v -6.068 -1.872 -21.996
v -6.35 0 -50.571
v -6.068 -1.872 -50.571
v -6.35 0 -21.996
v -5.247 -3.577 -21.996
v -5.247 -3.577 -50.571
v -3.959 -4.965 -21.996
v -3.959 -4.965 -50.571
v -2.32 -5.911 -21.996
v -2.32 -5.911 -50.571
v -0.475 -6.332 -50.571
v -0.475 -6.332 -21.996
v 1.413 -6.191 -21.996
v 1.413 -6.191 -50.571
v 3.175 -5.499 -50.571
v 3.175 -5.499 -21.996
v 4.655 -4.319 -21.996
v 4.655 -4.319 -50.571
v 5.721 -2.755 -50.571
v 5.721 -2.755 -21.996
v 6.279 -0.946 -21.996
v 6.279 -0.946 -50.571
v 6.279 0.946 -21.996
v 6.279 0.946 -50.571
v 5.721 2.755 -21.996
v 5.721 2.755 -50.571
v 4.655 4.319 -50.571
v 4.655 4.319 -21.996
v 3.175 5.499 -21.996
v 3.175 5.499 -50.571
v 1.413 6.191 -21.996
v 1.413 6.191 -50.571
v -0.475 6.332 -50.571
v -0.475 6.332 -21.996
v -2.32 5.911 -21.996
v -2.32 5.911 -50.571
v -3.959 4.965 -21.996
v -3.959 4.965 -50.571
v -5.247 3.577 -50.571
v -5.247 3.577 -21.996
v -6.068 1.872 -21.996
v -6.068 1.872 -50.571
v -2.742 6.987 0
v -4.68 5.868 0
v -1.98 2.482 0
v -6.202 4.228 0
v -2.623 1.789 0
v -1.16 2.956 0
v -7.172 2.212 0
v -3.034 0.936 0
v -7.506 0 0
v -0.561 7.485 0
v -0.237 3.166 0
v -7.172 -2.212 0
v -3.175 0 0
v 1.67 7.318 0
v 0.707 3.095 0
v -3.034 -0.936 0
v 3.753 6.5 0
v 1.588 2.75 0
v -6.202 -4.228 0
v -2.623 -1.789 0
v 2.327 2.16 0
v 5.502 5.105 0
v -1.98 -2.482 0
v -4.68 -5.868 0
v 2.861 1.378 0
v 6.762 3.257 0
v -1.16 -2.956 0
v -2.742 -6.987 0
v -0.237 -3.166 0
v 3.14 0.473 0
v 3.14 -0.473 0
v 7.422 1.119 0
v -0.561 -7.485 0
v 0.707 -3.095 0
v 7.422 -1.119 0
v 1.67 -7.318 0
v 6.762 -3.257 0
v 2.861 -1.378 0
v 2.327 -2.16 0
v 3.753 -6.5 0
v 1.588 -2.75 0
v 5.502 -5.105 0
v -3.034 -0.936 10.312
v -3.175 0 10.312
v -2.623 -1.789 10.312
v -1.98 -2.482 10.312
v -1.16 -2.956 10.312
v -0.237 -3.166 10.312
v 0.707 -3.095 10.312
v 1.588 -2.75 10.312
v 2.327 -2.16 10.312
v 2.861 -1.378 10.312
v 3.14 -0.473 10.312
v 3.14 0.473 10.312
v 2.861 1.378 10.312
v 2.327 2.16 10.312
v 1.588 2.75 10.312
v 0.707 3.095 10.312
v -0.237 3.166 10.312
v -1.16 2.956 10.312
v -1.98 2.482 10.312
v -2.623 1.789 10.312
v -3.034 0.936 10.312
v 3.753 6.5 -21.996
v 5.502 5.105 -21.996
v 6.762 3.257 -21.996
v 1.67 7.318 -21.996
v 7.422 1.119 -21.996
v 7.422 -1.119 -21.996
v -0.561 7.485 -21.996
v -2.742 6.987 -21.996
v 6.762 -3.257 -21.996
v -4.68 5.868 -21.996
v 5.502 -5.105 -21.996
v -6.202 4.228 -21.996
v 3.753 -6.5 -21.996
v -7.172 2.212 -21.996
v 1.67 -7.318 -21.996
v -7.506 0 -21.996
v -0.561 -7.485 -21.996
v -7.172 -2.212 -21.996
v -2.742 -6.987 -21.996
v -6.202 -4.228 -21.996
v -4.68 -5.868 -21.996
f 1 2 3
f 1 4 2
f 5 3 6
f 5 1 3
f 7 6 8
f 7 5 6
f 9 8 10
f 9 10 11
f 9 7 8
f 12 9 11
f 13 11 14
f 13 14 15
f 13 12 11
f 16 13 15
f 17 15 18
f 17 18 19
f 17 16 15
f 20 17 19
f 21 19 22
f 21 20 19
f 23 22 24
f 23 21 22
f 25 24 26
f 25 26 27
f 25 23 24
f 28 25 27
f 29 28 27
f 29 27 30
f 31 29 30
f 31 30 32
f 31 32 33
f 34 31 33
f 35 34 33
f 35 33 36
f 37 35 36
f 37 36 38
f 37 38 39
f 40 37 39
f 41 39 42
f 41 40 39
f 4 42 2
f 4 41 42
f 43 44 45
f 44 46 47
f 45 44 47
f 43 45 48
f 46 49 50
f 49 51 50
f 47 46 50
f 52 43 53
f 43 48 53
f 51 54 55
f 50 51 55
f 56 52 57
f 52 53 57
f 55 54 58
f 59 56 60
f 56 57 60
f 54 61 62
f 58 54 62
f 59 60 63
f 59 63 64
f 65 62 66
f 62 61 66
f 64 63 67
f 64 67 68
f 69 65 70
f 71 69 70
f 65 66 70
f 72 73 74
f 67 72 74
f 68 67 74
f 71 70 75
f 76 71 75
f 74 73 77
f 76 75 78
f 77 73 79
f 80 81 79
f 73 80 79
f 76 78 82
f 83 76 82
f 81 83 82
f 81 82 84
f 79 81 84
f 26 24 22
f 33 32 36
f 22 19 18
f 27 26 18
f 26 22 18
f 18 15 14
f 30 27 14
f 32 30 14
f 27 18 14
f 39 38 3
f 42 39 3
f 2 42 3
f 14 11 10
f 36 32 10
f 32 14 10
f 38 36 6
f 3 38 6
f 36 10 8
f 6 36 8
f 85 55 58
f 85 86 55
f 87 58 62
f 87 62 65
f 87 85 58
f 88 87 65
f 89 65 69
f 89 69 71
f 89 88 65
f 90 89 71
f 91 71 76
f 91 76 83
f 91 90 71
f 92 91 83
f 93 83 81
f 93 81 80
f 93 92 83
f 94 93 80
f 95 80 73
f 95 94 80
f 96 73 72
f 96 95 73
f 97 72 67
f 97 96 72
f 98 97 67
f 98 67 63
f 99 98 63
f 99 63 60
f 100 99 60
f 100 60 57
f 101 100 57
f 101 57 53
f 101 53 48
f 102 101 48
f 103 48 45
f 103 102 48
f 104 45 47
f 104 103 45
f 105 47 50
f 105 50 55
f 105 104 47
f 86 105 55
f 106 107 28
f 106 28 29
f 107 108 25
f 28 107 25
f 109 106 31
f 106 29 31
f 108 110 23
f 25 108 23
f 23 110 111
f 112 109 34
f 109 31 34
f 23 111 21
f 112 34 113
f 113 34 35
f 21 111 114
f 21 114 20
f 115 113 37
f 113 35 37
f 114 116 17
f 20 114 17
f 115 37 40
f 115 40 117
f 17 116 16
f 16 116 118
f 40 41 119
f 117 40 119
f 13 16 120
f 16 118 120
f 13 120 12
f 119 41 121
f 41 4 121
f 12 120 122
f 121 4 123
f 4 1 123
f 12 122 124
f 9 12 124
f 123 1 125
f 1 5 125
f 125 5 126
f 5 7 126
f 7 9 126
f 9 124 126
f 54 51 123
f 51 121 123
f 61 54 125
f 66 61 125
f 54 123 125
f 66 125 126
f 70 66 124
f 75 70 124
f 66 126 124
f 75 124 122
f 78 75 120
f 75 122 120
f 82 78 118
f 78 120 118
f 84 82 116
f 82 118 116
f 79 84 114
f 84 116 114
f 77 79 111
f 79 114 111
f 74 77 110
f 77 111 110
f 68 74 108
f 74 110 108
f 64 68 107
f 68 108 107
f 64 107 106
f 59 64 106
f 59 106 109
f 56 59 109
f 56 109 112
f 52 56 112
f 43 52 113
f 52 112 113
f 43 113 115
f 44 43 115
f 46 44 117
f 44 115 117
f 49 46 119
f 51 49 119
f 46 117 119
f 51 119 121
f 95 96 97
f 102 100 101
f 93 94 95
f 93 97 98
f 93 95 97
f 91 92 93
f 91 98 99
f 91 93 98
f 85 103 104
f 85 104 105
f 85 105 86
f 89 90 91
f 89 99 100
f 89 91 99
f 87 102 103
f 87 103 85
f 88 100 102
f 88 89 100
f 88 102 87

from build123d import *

# Parameters (mm, degrees)
F0_W   = 3.175
F0_H   = 10.3124
F0_W_2 = 6.35
F0_H_2 = 28.575


with BuildPart() as f1:
    # F0 (on Front) → F1 (revolve)
    with BuildSketch(Plane.XZ):
        with Locations((-1.5875, 5.1562)):
            Rectangle(F0_W, F0_H)
        Polygon((0, -21.9964), (0, 0), (-3.175, 0), (-7.5057, 0), (-7.5057, -21.9964), (-6.35, -21.9964), align=None)
        with Locations((-3.175, -36.2839)):
            Rectangle(F0_W_2, F0_H_2)
    revolve(axis=Axis((0, 0, 5.1562), (0, 0, 1)))


solid = f1.part
